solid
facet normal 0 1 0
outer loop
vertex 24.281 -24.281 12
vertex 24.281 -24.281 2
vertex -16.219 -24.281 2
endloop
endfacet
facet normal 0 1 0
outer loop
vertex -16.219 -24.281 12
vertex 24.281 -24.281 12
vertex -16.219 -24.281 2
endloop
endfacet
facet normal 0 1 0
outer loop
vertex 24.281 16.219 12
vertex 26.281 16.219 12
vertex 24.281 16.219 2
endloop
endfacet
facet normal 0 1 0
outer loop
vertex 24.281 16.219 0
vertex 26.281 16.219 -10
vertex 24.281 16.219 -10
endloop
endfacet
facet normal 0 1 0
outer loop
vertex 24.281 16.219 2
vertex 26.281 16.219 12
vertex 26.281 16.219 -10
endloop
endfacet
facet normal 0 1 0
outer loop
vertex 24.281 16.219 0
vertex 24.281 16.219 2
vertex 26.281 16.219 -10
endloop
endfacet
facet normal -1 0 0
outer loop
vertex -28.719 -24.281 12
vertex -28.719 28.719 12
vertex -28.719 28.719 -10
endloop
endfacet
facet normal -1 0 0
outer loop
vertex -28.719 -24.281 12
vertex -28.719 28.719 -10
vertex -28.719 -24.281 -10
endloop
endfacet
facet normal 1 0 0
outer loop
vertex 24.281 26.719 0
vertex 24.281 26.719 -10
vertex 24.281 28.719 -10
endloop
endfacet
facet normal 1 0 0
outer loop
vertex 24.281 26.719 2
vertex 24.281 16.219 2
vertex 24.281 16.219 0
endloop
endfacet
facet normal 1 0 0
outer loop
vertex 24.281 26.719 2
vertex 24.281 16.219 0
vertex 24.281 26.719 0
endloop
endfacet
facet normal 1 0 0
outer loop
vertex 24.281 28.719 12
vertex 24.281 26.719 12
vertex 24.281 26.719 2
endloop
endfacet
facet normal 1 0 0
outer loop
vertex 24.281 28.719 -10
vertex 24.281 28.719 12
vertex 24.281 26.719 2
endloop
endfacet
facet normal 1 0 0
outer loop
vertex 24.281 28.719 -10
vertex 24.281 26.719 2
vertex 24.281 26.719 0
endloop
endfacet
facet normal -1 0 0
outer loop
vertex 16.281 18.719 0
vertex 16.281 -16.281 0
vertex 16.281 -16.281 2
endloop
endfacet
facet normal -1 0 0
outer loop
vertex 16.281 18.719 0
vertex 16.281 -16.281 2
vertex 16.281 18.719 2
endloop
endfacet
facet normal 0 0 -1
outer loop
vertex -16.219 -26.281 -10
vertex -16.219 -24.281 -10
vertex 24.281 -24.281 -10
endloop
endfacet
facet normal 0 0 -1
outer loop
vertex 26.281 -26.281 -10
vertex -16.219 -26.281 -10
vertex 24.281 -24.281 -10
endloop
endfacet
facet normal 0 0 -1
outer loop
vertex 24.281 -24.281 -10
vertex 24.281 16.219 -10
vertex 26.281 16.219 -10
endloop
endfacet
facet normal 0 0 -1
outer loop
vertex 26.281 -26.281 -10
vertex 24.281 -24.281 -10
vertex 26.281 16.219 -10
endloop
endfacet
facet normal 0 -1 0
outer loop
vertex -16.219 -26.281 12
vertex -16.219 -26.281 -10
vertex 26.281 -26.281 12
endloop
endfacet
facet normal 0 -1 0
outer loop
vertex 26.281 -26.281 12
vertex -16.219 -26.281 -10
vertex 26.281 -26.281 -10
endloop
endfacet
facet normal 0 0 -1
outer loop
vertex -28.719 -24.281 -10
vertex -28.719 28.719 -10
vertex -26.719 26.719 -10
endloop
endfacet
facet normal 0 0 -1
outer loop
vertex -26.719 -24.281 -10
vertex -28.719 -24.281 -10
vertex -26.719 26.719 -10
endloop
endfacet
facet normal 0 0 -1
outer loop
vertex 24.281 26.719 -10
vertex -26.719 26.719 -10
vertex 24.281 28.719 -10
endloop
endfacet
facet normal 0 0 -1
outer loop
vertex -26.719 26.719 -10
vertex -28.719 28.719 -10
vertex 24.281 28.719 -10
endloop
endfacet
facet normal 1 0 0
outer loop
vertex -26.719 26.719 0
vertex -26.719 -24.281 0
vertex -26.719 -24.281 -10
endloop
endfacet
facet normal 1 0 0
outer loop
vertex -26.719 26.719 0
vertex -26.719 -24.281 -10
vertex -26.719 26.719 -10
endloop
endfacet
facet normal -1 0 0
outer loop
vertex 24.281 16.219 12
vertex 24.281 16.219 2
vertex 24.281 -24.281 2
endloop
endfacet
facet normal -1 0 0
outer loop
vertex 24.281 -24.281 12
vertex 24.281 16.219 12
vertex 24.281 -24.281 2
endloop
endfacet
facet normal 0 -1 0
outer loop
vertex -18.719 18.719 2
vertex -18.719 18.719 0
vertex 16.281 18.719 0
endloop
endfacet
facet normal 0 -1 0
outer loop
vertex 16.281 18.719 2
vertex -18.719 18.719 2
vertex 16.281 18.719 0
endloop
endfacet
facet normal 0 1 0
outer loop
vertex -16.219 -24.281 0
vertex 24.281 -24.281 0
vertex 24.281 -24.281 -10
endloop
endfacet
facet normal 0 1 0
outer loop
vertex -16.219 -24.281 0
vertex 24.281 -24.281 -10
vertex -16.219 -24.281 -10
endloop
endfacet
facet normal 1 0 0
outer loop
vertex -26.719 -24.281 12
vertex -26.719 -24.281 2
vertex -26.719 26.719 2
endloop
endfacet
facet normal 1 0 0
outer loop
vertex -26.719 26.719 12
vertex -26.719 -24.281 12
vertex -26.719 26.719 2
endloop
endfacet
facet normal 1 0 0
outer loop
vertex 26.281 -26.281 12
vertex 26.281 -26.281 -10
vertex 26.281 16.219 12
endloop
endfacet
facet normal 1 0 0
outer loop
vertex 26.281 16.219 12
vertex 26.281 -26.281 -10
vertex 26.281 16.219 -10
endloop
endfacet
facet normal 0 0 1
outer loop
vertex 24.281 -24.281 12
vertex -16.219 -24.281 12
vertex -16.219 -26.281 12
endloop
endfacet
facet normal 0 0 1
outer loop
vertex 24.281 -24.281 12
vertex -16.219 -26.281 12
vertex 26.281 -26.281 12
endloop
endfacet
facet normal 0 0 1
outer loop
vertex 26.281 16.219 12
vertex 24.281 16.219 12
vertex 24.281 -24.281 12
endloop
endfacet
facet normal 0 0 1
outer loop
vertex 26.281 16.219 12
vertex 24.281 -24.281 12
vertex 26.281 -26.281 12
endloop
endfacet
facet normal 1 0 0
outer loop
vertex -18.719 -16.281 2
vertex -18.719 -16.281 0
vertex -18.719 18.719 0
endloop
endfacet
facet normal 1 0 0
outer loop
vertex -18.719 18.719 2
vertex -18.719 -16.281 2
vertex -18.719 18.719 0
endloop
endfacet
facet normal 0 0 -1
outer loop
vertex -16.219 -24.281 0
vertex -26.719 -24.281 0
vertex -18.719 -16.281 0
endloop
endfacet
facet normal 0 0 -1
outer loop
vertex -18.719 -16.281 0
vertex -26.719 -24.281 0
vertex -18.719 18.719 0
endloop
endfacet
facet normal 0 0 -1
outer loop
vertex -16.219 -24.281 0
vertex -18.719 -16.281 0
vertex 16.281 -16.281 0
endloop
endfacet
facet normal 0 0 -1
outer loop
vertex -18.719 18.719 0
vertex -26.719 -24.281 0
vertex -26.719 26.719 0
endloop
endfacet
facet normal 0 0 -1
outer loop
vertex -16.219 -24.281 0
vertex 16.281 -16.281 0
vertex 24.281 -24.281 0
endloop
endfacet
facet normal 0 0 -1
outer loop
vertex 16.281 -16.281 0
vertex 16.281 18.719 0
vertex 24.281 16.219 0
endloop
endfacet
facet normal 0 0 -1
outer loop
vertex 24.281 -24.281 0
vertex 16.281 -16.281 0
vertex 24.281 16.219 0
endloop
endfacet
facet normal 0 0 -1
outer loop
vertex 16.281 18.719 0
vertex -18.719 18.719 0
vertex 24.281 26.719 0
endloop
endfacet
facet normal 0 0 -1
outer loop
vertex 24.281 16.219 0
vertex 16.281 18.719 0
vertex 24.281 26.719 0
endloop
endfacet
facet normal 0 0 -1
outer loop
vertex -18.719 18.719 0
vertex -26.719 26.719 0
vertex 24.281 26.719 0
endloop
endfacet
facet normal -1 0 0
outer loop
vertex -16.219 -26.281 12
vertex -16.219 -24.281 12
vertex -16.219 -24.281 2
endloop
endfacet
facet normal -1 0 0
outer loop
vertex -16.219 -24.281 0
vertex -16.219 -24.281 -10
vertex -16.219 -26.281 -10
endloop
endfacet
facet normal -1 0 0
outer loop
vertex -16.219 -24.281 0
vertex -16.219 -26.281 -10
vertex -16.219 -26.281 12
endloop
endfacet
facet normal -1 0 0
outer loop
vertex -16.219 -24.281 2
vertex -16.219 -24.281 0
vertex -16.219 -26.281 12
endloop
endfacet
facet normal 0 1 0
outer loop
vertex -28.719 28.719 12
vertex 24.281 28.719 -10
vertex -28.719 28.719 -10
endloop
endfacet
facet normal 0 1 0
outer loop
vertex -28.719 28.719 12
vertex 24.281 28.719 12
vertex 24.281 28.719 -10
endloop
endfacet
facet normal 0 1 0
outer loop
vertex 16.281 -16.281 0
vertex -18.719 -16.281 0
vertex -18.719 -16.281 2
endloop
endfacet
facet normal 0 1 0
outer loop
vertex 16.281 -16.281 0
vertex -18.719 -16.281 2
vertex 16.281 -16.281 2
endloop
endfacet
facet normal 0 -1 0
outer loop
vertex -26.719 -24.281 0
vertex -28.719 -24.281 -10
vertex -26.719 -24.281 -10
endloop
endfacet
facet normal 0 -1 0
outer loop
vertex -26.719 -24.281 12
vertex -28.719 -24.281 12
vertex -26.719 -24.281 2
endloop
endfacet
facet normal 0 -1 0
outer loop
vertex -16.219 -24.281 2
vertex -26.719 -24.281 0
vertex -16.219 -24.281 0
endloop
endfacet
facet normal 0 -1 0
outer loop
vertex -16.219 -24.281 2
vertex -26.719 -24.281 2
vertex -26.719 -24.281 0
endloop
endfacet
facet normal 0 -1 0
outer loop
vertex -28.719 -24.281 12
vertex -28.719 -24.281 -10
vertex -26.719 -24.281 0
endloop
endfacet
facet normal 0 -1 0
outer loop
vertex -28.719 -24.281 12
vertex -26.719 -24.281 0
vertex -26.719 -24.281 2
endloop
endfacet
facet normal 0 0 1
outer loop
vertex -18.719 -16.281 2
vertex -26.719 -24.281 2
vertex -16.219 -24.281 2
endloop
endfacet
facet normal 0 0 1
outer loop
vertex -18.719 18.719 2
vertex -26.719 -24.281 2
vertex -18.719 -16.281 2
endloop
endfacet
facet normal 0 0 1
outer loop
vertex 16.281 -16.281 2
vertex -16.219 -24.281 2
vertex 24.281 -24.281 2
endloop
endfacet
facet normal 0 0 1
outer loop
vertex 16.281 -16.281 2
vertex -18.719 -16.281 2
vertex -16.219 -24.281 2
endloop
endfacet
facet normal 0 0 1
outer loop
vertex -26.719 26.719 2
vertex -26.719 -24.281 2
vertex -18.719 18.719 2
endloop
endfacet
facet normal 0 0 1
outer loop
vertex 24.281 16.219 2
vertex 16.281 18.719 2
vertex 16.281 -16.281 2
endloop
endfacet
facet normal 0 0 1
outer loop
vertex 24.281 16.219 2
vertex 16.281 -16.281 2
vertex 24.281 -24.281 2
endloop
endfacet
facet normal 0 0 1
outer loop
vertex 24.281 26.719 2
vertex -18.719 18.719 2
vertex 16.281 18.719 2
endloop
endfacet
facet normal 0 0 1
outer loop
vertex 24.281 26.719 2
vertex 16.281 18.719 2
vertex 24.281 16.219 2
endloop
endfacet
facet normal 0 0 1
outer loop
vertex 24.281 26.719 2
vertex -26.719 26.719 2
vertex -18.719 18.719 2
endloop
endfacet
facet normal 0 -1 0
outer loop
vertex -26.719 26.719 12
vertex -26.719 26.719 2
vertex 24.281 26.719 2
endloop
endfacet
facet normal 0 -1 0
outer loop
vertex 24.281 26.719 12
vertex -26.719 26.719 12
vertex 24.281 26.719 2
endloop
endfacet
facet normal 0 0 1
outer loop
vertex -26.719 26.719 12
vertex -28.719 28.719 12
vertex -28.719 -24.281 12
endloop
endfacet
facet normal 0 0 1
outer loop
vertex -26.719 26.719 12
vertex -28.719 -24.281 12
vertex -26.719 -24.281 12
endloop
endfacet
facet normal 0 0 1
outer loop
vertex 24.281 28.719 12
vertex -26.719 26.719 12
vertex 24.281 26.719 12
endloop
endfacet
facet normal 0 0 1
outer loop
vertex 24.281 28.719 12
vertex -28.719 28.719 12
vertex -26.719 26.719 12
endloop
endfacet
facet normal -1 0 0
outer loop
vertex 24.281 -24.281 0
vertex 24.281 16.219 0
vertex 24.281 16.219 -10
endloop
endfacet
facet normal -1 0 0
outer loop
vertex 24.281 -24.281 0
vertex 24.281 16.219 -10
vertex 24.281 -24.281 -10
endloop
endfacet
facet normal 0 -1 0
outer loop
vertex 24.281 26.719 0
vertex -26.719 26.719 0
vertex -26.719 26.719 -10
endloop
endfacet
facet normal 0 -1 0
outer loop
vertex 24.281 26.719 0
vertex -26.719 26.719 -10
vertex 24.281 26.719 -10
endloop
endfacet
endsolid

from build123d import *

# Parameters (mm, degrees)
F1_DEPTH = 12
F0_W     = 35
F0_H     = 35
F2_DEPTH = 2
F0_R     = 5
F3_DEPTH = 10


with BuildPart() as f1:
    # F0 (on Top) → F1 (new body)
    with BuildSketch(Plane.XY):
        Polygon((24.28125, 28.71875), (-28.71875, 28.71875), (-28.71875, -24.28125), (-26.71875, -24.28125), (-26.71875, 26.71875), (24.28125, 26.71875), align=None)
    extrude(amount=F1_DEPTH)



with BuildPart() as f1b:
    # F0 (on Top) → F1, piece 2 (new body)
    with BuildSketch(Plane.XY):
        Polygon((26.28125, -26.28125), (26.28125, 16.21875), (24.28125, 16.21875), (24.28125, -24.28125), (-16.21875, -24.28125), (-16.21875, -26.28125), align=None)
    extrude(amount=F1_DEPTH)


with BuildPart() as f1_1:
    add(f1.part)

    add(f1b.part)  # F2 merges F1b
    # F0 (on Top) → F2 (join)
    with BuildSketch(Plane.XY):
        Polygon((24.28125, 18.71875), (24.28125, 26.71875), (-26.71875, 26.71875), (-26.71875, -24.28125), (-18.71875, -24.28125), (-16.21875, -24.28125), (24.28125, -24.28125), (24.28125, 16.21875), align=None)
        with Locations((-1.21875, 1.21875)):
            Rectangle(F0_W, F0_H, mode=Mode.SUBTRACT)
    extrude(amount=F2_DEPTH)

    # F0 (on Top) → F3 (join)
    with BuildSketch(Plane.XY):
        Polygon((24.28125, 28.71875), (-28.71875, 28.71875), (-28.71875, -24.28125), (-26.71875, -24.28125), (-26.71875, 26.71875), (24.28125, 26.71875), align=None)
        Polygon((26.28125, -26.28125), (26.28125, 16.21875), (24.28125, 16.21875), (24.28125, -24.28125), (-16.21875, -24.28125), (-16.21875, -26.28125), align=None)
    extrude(amount=-F3_DEPTH)


with BuildPart() as f2:
    # F0 (on Top) → F2, piece 2 (new body)
    with BuildSketch(Plane.XY):
        with Locations((-1.21875, 1.21875)):
            Circle(F0_R)
    extrude(amount=F2_DEPTH)


solid = f1_1.part
